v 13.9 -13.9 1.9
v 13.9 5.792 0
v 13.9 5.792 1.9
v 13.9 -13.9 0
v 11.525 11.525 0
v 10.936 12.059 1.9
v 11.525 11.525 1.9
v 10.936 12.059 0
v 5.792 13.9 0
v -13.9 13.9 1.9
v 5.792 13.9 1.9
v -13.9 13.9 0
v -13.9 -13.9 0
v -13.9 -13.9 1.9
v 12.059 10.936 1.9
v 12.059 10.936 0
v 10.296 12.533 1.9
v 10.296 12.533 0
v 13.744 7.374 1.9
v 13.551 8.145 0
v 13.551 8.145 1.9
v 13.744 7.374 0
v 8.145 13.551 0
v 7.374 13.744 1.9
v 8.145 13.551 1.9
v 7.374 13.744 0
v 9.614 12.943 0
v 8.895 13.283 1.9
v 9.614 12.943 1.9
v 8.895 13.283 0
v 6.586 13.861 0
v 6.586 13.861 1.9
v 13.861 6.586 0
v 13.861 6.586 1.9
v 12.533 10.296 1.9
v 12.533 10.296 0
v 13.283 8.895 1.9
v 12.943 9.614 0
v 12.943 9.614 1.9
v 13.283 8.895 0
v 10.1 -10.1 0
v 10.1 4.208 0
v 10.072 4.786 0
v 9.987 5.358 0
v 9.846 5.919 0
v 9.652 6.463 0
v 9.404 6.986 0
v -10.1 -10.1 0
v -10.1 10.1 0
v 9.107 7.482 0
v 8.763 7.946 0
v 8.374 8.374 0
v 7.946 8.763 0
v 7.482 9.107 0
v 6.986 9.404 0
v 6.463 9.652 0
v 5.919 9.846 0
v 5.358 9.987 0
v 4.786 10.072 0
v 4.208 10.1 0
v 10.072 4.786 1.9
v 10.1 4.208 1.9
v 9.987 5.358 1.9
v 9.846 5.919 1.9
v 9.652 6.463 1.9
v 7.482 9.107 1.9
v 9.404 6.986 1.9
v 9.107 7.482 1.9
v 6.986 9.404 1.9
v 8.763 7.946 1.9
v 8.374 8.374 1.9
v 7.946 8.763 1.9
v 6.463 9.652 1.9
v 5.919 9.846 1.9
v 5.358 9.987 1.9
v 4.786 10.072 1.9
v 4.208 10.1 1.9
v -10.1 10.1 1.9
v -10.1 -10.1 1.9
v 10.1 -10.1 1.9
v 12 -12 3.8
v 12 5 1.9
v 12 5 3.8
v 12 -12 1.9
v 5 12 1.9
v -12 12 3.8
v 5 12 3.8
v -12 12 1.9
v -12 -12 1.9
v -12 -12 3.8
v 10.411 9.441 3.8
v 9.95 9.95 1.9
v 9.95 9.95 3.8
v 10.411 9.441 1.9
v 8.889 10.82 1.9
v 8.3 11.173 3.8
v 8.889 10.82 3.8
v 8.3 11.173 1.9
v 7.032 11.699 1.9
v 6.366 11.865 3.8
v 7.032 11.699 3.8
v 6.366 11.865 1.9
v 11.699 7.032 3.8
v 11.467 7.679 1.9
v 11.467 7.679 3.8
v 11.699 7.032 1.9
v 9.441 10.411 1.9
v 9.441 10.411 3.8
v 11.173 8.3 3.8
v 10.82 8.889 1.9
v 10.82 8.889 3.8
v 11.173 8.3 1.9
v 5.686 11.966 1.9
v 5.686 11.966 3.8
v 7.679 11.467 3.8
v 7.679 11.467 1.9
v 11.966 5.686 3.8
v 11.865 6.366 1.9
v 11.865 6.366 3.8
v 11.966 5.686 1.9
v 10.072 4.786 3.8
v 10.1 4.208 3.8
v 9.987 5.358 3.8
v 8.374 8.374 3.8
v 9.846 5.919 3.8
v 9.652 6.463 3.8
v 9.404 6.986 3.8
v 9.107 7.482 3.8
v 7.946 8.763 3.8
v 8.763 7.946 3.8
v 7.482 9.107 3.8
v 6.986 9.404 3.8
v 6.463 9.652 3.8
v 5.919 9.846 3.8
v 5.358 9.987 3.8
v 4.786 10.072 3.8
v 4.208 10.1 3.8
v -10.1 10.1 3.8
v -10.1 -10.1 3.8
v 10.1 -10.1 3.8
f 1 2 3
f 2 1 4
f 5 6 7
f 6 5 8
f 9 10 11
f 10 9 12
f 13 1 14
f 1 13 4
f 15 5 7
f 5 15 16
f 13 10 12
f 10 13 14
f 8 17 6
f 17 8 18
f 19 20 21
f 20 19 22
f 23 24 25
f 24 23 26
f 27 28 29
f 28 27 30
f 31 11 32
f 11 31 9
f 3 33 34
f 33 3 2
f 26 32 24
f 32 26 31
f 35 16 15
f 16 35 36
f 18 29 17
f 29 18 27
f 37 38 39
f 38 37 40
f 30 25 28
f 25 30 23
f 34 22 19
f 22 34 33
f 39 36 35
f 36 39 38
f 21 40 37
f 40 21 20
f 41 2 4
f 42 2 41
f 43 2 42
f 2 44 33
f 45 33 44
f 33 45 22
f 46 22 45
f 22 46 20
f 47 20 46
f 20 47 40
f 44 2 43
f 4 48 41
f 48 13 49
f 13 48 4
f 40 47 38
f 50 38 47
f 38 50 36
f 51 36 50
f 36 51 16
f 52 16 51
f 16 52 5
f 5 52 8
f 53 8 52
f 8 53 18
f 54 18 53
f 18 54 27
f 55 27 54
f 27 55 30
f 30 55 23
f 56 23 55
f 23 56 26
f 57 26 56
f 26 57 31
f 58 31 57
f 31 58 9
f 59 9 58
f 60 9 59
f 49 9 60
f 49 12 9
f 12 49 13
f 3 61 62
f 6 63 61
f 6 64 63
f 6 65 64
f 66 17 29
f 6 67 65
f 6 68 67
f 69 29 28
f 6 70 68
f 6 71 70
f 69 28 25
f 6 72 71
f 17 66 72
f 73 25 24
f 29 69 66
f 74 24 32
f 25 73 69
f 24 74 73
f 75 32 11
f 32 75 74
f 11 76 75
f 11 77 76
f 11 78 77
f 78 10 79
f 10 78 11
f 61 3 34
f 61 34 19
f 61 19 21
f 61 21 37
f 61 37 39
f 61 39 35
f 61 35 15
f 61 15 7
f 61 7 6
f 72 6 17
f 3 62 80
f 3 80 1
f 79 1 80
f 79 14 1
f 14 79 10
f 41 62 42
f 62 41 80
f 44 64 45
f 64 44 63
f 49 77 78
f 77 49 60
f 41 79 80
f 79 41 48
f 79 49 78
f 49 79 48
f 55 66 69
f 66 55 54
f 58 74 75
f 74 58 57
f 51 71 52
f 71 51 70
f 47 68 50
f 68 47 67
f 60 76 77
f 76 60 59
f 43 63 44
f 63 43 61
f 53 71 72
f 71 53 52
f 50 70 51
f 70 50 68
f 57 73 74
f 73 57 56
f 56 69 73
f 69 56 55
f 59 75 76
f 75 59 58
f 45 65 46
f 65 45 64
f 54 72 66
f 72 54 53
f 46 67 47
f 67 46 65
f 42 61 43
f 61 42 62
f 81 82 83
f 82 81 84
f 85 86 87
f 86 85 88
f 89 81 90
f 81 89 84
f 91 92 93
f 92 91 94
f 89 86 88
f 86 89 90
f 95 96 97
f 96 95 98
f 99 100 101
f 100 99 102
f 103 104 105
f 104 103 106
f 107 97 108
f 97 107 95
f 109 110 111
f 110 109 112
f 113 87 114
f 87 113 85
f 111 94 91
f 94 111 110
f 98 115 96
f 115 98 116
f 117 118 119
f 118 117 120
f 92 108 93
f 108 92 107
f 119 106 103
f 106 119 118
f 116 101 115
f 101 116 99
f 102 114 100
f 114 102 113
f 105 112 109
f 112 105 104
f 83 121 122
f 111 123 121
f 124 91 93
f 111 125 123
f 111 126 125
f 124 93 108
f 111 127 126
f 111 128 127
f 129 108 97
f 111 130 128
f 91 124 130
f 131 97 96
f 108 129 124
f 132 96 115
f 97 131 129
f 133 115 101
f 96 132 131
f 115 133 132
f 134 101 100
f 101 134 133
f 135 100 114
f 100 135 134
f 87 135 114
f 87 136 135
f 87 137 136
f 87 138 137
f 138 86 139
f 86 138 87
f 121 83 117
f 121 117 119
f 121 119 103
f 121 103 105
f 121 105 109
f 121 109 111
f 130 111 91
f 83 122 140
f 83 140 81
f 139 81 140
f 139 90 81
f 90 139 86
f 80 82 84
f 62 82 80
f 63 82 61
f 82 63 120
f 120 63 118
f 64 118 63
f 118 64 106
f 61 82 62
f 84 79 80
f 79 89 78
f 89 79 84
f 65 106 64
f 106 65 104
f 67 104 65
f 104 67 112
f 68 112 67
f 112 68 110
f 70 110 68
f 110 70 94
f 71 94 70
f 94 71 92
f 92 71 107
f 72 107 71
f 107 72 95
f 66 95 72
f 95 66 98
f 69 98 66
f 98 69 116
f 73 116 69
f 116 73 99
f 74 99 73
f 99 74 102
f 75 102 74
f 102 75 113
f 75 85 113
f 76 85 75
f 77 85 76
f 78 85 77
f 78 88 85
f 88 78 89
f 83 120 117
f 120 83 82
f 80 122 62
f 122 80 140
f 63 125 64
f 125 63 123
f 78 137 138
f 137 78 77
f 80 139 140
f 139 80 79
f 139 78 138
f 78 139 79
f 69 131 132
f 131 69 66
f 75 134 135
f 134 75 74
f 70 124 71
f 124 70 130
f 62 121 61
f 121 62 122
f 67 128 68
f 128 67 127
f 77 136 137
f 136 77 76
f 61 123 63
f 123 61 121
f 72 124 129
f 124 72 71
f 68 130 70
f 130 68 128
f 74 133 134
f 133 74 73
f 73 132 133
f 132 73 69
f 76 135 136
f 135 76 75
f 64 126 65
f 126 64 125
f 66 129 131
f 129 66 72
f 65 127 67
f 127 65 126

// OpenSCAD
// file: measurements.scad
thickness = 1.9;
finger_d = 22;

module holder(h) {
    // Child 0 is the outer shape
    // Child 1 is the inner shape
    // Child 2 is the end-cap hole shape
    // Bottom end
    difference() {
        linear_extrude(thickness) { children(0); }
        translate([0, 0, -1])
            linear_extrude(thickness+2) { children(2); }
    }
    // Main chamber: h + thickness to leave room for the lid.
    translate([0, 0, thickness])
        difference() {
            linear_extrude(h + thickness) { children(0); }
            translate([0, 0, -1])
                linear_extrude(h + thickness + 2) { children(1); }
        }
}

module lid() {
    // Child 0 is the outer shape
    // Child 1 is the inner shape
    // Child 2 is the end-cap hole shape
    // Bottom end
    difference() {
        linear_extrude(thickness) { children(0); }
        translate([0, 0, -1])
            linear_extrude(thickness+2) { children(2); }
    }
    // Cap plug
    translate([0, 0, thickness])
        difference() {
            linear_extrude(thickness) { children(1); }
            translate([0, 0, -1])
                linear_extrude(thickness+2) { children(2); }
        }
}

//
// Discovery Tiles
//

discovery_w = 24;
discovery_count = 21;

function discovery_corner_r(w) = w * 7 / 24;

module discovery_tile_shape(w) {
    r = discovery_corner_r(w);
    translate([-w/2, -w/2]) {
        translate([w-r, w-r])
            circle(r=r, $fn=64);
        square([w-r, w]);
        square([w, w-r]);
    }
}

//
// Ancients
//

ancient_r = 19.5;
ancient_count = 22;

//
// Monotliths/Orbitals
//

monolith_orbital_d = 25.25;
monolith_orbital_count = 22;
// main file
include <measurements.scad>

lid() {
    discovery_tile_shape(discovery_w + thickness*2);
    discovery_tile_shape(discovery_w);
    discovery_tile_shape(discovery_w - thickness*2);
}
